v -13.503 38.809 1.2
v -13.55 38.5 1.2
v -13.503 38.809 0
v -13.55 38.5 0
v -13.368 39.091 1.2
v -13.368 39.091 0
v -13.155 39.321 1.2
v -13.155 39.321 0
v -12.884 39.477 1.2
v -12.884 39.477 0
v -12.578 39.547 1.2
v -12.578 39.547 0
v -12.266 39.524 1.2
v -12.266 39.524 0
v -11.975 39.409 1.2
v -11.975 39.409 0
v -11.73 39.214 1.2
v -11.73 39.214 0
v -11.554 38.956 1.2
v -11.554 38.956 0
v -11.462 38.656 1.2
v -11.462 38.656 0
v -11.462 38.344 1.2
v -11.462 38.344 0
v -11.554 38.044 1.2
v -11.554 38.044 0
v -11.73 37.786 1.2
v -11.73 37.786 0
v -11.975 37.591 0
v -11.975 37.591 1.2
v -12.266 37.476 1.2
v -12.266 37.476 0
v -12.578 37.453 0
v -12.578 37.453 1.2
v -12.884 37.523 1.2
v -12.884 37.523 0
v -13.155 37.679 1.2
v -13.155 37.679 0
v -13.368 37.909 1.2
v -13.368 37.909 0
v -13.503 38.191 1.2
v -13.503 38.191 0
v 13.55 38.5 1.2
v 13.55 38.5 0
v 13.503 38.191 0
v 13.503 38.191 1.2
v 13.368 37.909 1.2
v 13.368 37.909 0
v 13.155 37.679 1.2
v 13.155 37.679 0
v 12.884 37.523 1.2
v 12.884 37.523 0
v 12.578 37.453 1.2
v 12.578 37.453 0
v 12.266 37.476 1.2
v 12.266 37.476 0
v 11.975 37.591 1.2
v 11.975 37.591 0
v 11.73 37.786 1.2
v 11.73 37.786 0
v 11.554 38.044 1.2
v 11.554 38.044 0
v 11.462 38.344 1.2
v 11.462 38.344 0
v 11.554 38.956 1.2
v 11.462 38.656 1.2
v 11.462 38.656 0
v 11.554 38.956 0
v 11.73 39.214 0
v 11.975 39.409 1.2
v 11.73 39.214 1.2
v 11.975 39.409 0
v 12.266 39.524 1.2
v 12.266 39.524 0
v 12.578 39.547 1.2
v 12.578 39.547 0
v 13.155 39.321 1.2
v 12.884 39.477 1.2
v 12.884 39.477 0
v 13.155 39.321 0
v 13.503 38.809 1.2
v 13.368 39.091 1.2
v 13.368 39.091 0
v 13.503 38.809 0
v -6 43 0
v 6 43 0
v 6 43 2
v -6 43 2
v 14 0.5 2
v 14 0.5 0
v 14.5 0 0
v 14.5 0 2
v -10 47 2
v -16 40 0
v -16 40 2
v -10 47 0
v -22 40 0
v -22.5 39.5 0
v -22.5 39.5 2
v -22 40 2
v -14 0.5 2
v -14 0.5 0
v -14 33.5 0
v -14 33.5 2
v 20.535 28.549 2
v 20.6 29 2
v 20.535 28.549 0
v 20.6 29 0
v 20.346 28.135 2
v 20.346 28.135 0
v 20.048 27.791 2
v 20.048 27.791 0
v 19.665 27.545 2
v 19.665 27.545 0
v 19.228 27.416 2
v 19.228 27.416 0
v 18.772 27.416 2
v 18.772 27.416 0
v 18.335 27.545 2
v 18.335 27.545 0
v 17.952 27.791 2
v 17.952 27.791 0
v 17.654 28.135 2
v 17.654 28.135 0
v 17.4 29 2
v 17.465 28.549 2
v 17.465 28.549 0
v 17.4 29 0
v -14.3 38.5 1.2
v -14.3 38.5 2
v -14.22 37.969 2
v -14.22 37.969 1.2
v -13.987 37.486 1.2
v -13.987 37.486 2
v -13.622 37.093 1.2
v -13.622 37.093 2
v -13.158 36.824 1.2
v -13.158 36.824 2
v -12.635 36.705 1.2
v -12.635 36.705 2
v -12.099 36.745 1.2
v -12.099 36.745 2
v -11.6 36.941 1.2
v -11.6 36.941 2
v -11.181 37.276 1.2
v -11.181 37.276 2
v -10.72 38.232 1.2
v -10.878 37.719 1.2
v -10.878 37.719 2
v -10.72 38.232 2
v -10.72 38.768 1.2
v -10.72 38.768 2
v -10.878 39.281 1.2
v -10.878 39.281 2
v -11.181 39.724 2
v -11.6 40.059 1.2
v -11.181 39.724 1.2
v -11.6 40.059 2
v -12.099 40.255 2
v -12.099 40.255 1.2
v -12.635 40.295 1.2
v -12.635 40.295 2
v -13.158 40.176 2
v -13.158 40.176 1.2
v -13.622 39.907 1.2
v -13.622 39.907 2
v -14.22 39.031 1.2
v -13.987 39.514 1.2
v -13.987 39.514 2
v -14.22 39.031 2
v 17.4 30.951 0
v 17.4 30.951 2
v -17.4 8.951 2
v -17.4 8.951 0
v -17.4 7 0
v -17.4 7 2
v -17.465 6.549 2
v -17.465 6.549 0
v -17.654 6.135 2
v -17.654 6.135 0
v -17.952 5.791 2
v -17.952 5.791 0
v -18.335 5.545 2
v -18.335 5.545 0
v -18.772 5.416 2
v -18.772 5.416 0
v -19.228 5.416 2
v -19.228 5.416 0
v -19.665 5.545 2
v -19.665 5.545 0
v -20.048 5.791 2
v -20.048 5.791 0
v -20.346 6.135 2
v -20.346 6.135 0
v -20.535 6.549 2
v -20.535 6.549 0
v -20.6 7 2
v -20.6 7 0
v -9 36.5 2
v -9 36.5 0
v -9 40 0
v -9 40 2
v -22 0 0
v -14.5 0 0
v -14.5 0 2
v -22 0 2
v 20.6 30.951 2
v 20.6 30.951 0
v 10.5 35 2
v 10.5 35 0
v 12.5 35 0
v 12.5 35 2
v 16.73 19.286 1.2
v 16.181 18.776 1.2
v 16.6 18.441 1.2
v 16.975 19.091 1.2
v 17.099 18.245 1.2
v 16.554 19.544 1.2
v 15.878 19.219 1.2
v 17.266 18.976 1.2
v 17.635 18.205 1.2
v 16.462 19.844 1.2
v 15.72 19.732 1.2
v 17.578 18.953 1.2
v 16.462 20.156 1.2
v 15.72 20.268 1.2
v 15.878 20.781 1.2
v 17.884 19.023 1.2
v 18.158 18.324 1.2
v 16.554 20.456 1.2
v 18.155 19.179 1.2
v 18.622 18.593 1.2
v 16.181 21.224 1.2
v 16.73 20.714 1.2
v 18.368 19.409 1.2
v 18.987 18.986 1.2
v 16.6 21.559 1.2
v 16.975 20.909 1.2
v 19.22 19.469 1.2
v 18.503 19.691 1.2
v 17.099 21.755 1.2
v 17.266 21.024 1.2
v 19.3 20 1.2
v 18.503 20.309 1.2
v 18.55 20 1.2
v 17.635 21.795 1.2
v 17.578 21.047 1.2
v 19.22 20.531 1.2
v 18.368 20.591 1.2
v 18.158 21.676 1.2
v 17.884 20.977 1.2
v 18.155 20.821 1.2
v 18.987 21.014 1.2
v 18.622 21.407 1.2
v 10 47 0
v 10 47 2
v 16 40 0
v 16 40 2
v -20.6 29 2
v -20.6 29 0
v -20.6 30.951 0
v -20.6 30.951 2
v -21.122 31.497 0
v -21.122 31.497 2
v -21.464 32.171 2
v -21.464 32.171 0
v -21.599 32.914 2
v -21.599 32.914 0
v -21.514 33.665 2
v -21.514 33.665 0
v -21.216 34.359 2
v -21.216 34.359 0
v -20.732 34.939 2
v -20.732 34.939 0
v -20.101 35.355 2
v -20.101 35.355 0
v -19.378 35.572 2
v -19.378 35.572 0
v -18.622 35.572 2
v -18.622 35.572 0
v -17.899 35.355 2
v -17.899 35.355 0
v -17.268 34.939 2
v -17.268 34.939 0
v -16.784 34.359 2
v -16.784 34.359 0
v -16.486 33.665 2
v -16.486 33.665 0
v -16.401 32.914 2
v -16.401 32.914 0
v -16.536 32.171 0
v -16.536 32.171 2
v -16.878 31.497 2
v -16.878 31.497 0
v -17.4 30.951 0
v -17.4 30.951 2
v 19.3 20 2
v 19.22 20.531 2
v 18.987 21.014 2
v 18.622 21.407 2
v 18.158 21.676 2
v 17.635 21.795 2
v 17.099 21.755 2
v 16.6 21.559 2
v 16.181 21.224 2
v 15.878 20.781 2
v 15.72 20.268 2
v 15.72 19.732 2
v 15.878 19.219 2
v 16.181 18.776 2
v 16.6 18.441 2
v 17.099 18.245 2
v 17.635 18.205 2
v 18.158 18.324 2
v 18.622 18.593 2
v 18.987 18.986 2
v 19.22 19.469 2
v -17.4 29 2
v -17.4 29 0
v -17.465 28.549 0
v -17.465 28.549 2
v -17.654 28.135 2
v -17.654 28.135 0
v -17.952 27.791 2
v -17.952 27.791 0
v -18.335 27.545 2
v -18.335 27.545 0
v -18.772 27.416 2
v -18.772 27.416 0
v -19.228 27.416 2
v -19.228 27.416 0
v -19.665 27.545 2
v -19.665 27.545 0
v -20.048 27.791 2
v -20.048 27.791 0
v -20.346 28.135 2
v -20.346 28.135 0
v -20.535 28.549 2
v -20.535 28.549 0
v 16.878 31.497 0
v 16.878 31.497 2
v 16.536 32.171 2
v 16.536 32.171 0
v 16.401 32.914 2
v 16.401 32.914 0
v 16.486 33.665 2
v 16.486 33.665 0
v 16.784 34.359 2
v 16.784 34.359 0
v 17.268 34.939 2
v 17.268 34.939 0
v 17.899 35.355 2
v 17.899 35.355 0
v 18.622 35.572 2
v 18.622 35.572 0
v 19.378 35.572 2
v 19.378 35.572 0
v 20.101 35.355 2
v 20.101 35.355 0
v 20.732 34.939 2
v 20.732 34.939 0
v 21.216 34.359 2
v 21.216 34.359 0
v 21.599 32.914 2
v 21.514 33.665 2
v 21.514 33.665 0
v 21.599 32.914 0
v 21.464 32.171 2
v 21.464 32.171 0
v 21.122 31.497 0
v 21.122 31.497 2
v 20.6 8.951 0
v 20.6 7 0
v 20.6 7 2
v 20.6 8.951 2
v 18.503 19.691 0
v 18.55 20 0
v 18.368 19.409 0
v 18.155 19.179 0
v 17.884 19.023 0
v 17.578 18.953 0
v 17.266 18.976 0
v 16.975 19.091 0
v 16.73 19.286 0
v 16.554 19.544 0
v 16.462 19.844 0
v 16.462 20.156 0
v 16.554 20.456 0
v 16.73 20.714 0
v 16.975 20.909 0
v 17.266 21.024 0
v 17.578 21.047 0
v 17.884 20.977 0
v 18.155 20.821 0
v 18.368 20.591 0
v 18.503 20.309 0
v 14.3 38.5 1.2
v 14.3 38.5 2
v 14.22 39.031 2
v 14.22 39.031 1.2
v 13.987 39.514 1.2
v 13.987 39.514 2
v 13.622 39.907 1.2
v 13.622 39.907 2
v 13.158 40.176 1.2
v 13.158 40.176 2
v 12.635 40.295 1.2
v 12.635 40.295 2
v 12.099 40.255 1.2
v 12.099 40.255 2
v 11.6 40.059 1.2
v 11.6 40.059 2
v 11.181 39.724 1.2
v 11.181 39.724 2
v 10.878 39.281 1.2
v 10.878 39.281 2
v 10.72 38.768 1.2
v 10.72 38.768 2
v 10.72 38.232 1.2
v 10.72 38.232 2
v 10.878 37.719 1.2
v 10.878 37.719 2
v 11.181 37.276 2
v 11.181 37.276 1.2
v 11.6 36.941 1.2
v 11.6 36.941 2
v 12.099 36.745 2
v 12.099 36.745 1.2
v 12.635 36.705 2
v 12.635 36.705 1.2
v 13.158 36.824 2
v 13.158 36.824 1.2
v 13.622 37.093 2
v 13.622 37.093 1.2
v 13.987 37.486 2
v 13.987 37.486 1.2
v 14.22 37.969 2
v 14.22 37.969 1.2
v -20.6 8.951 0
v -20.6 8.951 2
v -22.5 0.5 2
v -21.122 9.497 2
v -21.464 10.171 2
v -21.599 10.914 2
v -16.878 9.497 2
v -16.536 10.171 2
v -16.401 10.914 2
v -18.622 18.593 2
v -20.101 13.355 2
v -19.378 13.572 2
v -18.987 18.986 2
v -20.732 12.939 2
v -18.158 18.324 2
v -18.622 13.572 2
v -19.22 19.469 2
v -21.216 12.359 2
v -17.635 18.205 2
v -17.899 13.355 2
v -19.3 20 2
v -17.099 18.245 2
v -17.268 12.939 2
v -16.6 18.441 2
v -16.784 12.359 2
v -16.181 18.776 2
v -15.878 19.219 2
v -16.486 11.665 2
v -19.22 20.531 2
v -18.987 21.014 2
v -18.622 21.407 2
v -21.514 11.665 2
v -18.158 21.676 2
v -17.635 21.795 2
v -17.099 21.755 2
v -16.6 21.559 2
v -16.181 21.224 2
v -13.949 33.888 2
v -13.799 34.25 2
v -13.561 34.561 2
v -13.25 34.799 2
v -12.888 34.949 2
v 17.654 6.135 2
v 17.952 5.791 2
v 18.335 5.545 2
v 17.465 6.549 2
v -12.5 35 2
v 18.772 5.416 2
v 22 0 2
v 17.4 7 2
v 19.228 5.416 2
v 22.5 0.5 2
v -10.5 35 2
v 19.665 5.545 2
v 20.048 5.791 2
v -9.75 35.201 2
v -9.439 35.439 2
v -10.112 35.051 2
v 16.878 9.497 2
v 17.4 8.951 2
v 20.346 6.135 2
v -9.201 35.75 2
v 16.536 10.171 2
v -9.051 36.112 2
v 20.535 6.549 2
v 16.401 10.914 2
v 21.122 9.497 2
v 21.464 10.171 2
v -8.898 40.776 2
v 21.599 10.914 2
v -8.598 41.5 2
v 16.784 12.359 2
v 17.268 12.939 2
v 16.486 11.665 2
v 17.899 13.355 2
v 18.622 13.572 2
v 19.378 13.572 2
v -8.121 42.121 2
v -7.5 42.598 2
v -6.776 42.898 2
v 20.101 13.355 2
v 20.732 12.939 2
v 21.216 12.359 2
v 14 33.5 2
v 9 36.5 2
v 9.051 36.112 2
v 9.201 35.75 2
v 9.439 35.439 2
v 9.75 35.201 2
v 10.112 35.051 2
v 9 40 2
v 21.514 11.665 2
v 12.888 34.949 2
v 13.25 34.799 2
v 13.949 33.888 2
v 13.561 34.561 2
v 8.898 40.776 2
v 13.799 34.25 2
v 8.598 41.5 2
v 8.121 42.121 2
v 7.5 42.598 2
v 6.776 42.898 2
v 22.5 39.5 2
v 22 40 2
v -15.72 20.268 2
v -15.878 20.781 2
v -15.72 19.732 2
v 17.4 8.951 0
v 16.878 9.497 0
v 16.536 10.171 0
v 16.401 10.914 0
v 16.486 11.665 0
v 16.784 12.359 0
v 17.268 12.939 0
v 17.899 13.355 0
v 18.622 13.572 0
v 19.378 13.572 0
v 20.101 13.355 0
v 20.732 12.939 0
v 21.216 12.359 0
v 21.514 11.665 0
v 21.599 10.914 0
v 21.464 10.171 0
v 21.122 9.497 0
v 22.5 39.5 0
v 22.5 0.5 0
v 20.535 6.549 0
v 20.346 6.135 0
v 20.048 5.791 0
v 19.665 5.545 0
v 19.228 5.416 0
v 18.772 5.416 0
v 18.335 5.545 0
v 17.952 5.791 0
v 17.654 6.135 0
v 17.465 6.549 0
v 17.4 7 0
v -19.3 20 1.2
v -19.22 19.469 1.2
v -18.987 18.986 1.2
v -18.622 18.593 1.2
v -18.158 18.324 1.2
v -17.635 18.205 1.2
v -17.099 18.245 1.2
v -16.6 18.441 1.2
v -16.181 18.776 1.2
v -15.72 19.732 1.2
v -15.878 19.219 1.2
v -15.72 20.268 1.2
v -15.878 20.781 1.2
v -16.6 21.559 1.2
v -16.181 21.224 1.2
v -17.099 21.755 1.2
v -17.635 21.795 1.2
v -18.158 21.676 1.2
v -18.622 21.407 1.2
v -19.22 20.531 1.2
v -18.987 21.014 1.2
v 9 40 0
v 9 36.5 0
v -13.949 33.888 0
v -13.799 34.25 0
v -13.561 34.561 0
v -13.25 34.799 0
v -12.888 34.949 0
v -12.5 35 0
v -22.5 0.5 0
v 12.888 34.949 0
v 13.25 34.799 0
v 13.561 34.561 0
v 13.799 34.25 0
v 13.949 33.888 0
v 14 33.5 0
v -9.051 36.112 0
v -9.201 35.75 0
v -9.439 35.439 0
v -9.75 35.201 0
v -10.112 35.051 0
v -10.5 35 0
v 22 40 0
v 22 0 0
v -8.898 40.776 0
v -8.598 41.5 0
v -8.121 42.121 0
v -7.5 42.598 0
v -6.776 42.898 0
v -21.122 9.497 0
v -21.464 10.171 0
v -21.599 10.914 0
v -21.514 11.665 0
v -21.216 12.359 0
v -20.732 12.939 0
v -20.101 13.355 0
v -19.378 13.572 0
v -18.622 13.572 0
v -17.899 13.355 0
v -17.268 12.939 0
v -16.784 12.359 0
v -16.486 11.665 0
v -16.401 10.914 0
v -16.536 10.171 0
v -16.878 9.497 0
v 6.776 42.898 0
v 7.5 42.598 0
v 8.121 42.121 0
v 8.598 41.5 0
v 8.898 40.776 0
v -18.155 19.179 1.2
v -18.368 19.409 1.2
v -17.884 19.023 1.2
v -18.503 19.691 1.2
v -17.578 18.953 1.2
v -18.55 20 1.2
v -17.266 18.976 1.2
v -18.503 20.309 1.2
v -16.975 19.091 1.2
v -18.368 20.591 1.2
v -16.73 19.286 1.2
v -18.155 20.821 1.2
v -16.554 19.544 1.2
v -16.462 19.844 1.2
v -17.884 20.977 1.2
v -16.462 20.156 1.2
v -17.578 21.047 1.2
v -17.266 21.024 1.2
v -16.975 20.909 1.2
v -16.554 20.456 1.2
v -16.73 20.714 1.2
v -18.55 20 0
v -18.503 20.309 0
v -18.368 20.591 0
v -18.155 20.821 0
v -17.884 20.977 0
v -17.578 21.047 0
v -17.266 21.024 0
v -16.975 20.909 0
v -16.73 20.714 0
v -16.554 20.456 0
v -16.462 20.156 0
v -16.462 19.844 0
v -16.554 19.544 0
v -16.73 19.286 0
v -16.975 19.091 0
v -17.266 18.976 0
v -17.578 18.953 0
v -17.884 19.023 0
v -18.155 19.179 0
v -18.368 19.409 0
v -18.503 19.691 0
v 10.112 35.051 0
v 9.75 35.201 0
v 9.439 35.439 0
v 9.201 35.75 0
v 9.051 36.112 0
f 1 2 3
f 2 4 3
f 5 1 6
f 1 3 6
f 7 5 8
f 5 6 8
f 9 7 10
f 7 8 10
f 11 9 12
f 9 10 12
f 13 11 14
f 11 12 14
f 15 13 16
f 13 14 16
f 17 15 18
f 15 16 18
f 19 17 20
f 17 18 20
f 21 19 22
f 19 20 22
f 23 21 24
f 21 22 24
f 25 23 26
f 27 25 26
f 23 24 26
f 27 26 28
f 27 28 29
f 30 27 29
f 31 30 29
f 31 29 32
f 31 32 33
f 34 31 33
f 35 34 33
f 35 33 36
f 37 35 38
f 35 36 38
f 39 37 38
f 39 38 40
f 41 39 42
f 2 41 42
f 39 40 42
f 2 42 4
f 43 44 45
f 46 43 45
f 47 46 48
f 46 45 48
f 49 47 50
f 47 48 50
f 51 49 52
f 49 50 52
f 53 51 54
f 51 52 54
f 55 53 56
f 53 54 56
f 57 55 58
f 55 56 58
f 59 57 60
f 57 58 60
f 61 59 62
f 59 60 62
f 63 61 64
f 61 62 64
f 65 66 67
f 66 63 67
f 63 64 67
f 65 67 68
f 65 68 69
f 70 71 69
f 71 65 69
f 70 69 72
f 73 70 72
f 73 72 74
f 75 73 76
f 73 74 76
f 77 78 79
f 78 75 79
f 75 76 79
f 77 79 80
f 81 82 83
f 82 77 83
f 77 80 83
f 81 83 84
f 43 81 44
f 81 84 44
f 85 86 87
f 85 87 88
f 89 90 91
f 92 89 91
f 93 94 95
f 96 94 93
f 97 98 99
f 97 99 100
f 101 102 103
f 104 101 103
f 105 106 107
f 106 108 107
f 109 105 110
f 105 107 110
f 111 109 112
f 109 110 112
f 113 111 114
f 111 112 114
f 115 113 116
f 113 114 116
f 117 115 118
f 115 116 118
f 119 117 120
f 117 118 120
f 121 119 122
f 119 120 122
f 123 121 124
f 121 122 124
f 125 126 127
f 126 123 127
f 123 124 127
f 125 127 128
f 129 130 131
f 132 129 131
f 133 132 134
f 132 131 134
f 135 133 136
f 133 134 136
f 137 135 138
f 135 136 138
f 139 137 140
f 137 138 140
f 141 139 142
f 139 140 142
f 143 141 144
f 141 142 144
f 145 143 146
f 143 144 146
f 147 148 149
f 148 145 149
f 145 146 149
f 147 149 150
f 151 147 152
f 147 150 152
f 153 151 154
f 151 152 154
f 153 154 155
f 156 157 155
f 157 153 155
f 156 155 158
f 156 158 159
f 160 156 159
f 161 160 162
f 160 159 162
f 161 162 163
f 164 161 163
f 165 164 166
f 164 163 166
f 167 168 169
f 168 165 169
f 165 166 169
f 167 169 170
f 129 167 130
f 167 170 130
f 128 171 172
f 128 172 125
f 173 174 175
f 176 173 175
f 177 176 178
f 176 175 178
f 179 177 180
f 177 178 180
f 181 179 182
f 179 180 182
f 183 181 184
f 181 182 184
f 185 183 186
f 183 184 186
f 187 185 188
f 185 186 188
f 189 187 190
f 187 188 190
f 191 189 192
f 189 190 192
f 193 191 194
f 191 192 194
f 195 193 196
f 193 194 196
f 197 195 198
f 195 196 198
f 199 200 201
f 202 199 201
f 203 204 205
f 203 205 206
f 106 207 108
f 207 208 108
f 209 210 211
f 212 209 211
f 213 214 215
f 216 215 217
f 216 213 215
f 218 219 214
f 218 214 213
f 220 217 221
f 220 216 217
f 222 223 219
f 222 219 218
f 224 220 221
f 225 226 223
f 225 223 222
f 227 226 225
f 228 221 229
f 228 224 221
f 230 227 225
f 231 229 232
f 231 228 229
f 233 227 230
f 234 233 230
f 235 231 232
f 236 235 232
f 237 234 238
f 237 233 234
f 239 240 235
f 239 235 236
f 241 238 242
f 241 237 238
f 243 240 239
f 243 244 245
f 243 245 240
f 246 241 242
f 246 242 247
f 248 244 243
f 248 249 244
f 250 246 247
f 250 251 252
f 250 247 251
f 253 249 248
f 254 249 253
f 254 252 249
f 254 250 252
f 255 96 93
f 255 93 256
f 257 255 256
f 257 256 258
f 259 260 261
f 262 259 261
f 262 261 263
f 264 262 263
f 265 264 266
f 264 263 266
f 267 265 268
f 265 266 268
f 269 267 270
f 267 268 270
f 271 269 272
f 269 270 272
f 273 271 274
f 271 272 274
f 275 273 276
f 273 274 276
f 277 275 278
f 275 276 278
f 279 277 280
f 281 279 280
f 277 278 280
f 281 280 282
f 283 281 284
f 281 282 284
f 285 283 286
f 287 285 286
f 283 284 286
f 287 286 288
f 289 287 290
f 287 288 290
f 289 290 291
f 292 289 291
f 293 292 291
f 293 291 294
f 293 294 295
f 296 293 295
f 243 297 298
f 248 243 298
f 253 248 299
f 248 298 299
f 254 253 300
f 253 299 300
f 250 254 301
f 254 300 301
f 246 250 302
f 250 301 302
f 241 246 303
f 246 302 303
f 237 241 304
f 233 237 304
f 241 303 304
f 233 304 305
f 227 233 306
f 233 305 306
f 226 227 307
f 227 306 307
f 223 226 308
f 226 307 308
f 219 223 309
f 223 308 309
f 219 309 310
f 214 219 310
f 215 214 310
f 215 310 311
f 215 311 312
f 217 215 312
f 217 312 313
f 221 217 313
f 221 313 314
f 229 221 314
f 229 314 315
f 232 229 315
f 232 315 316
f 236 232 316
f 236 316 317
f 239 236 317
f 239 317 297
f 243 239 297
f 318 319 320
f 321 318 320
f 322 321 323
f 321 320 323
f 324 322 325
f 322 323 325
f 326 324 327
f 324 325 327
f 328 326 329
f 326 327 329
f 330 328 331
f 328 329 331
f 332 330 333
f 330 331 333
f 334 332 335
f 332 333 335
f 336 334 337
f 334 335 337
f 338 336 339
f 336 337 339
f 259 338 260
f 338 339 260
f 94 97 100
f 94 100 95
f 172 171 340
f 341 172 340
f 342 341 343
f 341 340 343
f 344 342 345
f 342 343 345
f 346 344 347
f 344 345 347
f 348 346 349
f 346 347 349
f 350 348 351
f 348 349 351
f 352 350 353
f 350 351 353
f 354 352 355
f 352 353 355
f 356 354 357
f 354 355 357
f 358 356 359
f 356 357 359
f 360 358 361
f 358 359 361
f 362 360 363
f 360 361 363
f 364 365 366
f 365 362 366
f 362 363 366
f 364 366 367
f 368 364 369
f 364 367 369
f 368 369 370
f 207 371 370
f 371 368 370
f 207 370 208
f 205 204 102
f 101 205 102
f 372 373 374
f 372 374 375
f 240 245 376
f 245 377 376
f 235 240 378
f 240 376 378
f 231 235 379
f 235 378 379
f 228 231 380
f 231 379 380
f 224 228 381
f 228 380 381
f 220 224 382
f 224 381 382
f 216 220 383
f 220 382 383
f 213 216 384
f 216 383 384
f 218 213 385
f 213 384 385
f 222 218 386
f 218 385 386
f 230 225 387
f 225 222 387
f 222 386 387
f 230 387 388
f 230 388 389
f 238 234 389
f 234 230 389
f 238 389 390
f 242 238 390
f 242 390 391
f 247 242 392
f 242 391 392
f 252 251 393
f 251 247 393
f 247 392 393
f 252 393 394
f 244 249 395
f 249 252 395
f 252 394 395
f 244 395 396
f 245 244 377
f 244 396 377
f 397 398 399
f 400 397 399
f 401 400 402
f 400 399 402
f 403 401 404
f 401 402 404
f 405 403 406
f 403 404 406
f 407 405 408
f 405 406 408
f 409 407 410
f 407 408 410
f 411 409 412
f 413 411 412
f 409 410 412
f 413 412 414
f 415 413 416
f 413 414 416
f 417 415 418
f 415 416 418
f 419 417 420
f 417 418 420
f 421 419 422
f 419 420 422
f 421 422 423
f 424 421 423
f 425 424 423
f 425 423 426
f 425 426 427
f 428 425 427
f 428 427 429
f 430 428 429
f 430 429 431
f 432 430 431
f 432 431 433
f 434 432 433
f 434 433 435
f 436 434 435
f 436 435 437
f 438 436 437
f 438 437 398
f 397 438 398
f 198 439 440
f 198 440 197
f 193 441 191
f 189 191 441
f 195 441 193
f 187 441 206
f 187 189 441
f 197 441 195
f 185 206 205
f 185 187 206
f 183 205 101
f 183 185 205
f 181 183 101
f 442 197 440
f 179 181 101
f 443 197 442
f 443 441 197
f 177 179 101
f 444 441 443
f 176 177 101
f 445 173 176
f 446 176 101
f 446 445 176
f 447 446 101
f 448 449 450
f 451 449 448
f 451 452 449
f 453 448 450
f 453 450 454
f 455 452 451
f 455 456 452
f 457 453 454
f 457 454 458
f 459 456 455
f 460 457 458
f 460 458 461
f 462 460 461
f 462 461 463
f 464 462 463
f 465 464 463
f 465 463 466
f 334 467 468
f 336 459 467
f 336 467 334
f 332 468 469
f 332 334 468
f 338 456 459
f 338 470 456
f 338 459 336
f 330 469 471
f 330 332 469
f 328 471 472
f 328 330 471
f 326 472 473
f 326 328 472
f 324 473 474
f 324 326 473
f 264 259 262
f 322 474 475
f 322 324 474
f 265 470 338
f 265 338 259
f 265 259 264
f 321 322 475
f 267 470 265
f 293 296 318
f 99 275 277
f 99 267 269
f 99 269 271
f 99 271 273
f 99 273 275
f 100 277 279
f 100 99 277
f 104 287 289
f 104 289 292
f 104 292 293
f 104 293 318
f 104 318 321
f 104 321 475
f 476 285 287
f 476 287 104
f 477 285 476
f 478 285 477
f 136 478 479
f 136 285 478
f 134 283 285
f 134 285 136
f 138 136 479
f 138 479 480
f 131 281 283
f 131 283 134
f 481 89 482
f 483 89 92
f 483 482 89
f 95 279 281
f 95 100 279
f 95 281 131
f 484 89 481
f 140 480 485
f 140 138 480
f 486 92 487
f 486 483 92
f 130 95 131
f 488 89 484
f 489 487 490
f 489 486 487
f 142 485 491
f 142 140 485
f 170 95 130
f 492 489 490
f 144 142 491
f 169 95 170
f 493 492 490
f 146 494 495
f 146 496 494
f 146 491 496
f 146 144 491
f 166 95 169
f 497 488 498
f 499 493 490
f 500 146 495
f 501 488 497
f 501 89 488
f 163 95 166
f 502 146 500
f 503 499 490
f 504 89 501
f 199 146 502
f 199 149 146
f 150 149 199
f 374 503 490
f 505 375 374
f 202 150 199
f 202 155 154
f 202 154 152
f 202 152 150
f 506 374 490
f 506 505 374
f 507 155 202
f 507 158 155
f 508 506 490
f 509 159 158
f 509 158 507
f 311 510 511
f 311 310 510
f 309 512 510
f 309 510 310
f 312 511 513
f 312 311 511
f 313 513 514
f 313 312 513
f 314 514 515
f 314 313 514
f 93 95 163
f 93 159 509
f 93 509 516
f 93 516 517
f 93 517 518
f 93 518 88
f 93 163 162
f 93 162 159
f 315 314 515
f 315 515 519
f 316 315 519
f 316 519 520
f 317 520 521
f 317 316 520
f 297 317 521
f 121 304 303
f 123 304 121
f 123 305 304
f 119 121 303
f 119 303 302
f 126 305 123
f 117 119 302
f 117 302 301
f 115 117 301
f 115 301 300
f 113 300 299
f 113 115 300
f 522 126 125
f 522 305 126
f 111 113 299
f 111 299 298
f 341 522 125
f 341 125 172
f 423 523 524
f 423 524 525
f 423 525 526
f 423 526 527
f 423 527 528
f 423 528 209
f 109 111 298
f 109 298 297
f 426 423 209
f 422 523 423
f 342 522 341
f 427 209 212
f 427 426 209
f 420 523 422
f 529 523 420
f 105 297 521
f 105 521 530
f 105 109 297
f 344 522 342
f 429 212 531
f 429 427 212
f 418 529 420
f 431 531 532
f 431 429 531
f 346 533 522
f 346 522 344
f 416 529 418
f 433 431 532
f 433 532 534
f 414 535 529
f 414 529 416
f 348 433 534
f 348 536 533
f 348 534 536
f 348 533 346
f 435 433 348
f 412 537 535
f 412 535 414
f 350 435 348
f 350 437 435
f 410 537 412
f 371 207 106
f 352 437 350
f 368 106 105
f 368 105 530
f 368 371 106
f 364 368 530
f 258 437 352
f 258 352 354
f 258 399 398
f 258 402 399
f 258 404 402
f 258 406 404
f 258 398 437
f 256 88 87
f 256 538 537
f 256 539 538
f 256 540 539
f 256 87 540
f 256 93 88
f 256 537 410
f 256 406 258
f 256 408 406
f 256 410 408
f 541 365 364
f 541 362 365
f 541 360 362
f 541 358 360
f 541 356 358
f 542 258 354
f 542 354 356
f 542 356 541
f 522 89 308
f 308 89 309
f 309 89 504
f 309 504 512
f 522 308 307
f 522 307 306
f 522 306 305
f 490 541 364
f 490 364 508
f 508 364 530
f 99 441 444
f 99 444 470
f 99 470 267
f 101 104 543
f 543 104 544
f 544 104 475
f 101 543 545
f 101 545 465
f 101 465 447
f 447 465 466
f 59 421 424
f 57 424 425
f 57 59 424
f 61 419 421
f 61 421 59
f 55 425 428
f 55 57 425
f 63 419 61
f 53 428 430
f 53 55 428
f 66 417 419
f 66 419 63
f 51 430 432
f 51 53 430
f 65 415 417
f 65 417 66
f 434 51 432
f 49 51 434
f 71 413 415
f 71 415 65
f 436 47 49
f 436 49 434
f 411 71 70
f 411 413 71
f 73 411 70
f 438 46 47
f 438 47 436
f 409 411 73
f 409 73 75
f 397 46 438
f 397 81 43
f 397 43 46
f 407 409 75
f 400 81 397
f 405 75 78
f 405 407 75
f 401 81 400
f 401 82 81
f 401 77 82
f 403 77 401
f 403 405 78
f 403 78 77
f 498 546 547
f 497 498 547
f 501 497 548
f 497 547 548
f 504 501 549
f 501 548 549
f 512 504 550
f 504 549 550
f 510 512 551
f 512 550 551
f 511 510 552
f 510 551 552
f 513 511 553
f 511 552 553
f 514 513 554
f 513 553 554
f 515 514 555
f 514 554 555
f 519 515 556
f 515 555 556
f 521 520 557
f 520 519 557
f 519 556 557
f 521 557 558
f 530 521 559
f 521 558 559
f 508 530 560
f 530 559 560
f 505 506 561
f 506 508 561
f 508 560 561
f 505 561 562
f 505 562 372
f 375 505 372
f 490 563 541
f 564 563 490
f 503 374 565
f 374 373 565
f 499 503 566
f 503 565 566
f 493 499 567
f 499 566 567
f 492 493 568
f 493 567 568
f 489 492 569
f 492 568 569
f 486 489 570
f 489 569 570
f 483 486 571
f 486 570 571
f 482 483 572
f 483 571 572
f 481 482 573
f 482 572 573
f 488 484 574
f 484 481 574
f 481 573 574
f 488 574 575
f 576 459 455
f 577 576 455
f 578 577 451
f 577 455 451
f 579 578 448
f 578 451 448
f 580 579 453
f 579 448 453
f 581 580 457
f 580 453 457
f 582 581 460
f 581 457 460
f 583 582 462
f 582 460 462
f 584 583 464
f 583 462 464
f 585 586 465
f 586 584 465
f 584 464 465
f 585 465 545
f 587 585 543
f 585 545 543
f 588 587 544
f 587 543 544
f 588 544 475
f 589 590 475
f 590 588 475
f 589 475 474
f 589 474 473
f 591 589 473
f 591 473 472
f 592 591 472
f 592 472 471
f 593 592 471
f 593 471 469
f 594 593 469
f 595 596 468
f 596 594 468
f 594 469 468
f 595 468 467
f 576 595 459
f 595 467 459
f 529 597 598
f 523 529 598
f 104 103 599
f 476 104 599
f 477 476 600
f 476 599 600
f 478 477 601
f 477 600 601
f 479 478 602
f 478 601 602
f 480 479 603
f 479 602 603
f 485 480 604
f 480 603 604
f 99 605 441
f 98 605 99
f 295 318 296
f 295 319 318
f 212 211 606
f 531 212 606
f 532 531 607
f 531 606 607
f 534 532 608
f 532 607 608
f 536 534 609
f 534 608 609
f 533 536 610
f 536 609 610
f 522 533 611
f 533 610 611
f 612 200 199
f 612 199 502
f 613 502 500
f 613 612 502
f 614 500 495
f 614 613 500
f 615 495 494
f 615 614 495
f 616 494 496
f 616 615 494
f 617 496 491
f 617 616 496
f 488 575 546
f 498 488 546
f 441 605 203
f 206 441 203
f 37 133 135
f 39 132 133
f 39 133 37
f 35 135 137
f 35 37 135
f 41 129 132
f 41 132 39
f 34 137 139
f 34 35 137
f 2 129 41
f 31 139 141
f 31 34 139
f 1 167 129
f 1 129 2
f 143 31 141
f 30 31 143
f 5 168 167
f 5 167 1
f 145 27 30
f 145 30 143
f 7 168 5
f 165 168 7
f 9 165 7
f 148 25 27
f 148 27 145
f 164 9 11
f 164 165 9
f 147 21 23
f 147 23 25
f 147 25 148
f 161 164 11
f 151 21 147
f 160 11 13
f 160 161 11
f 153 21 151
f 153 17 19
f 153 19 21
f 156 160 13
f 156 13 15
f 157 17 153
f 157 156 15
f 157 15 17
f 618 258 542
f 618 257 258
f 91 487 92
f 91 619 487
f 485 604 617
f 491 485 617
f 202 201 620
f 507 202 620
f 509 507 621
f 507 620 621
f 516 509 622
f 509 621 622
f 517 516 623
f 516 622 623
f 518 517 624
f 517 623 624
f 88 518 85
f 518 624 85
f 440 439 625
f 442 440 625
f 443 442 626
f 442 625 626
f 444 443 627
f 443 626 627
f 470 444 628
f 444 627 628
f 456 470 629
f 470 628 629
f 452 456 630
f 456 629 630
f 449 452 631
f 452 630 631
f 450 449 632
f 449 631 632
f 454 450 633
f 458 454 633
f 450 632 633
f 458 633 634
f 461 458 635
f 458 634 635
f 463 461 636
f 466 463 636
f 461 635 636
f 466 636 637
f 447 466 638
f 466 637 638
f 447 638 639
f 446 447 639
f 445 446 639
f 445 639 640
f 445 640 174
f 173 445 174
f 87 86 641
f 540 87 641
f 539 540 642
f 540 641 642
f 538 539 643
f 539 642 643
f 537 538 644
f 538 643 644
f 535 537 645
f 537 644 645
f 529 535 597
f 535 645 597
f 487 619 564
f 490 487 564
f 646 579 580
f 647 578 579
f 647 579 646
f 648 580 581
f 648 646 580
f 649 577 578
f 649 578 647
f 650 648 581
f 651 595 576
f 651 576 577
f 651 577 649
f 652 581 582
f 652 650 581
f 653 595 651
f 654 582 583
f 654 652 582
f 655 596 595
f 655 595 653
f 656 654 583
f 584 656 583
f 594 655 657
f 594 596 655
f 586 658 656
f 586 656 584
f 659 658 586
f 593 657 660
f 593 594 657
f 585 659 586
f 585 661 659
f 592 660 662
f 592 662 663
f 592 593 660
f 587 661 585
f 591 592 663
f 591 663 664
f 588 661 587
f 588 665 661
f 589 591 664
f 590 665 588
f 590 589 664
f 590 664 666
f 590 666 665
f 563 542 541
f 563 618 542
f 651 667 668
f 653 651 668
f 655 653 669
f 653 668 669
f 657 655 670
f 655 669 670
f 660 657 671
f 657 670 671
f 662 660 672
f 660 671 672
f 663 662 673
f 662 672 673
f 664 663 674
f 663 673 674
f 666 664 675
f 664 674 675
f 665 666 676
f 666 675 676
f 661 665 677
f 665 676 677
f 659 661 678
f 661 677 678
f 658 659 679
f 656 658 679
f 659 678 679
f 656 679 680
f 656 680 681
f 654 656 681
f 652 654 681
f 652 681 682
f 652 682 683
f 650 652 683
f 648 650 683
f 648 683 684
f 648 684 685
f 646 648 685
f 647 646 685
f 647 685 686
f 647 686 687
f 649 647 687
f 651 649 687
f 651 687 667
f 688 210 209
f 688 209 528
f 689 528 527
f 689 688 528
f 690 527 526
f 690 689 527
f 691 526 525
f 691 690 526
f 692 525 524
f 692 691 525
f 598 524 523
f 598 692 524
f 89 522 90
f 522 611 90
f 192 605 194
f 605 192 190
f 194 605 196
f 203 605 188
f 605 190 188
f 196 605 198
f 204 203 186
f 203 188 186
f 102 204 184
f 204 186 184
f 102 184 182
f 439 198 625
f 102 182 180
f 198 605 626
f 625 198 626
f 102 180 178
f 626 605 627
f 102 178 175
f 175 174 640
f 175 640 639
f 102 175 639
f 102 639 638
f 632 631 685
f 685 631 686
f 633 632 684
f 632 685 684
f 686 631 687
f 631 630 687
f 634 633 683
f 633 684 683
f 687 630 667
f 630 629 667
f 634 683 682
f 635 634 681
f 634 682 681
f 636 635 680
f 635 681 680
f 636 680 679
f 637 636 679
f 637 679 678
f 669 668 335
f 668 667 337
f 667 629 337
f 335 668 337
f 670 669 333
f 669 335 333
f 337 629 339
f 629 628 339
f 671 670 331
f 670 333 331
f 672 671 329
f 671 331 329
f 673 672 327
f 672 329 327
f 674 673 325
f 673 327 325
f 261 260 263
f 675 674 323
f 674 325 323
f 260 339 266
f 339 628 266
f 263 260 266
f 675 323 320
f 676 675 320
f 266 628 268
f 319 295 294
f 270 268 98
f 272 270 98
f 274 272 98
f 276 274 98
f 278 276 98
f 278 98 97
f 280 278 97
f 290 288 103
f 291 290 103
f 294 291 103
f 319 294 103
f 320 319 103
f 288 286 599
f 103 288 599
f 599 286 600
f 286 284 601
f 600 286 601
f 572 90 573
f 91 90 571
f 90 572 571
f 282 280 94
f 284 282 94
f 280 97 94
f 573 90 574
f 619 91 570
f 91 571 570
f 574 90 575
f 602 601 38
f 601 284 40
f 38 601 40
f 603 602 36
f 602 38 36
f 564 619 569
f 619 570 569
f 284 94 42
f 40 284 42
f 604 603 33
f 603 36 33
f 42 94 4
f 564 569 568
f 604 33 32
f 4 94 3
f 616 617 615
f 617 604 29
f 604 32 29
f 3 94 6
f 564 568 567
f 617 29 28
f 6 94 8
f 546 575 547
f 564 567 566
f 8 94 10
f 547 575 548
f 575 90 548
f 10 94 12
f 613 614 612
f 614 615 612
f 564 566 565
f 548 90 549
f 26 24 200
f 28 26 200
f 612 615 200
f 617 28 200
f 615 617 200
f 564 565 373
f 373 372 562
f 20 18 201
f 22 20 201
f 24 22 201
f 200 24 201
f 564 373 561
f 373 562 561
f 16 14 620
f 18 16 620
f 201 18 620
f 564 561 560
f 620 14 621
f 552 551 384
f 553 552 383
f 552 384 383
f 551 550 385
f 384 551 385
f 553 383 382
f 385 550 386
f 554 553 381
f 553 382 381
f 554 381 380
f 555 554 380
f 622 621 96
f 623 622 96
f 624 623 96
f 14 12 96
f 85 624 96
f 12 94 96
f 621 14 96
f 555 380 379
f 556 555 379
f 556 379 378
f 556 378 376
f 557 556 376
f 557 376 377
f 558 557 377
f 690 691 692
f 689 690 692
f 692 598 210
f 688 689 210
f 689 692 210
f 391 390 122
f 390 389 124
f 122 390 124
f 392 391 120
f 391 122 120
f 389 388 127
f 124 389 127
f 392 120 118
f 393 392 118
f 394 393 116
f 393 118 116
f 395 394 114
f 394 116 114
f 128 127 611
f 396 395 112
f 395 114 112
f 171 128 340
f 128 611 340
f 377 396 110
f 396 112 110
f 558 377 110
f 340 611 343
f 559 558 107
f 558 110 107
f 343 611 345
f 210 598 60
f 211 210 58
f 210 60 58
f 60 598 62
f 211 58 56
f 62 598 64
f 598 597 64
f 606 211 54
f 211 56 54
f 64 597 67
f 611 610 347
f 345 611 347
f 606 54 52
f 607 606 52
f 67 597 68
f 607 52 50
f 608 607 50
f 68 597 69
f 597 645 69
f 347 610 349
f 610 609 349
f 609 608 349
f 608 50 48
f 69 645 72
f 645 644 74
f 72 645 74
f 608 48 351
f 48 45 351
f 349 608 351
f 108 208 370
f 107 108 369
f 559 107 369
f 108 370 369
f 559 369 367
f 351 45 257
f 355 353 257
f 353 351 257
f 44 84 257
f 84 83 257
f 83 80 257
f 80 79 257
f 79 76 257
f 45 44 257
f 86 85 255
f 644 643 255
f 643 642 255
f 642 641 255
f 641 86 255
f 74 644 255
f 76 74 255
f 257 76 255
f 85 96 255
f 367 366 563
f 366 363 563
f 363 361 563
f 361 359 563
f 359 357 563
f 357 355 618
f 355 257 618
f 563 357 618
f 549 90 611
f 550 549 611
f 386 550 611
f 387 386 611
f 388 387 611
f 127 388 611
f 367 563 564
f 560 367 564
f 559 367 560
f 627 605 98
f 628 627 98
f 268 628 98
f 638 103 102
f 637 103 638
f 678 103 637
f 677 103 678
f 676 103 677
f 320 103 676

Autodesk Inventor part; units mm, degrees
ref_plane "YZ Plane" through (0, 0, 0) normal (1, 0, 0) x (0, 1, 0)
ref_plane "XZ Plane" through (0, 0, 0) normal (0, 1, 0) x (-1, 0, 0)
ref_plane "XY Plane" through (0, 0, 0) normal (0, 0, 1) x (1, 0, 0)
sketch "スケッチ1" plane through (0, 0, 0) normal (0, 0, 1) x (1, 0, 0)
  line L0 (0, 0) -> (0, 51.1276) construction
  line L1 (-6, 43) -> (6, 43) construction
  arc A0 (9, 40) -> (6, 43) centre (6, 40) ccw projected
  line L2 (9, 40) -> (9, 36.5) projected
  line L3 (10.5, 35) -> (12.5, 35)
  arc A1 (14, 33.5) -> (12.5, 35) centre (12.5, 33.5) ccw
  line L4 (14, 0) -> (14, 33.5) construction
  line L5 (10, 47) -> (-10, 47) construction
  line L6 (16, 40) -> (10, 47) construction
  line L7 (16, 26.6395) -> (16, 40) construction
  circle A2 centre (12.5, 38.5) radius 1.5 construction
  circle A3 centre (17.5, 20) radius 1.5 construction
  line L8 (22.5, 39.5) -> (22.5, 0.5)
  line L9 (22, 0) -> (14.5, 0)
  arc A4 (20.6, 30.9506) -> (17.4, 30.9506) centre (19, 33) ccw
  arc A5 (17.4, 29) -> (20.6, 29) centre (19, 29) ccw
  line L10 (17.4, 30.9506) -> (17.4, 29)
  line L11 (20.6, 30.9506) -> (20.6, 29)
  line L12 (19, 29) -> (19, 33) construction
  line L13 (10, 47) -> (16, 40)
  arc A6 (17.4, 7) -> (20.6, 7) centre (19, 7) ccw
  line L14 (17.4, 7) -> (17.4, 8.9506)
  line L15 (20.6, 7) -> (20.6, 8.9506)
  arc A7 (20.6, 8.9506) -> (17.4, 8.9506) centre (19, 11) ccw
  line L16 (19, 11) -> (19, 7) construction
  line L17 (14, 33.5) -> (14, 0.5)
  line L18 (0, 43) -> (0, 47)
  line L19 (0, 47) -> (10, 47)
  line L20 (6, 43) -> (0, 43)
  line L21 (16, 40) -> (22, 40)
  line L22 (22, 40) -> (22.5, 39.5)
  line L23 (22, 0) -> (22.5, 0.5)
  circle A8 centre (17.5, 20) radius 1.05
  circle A9 centre (12.5, 38.5) radius 1.05
  arc A10 (9, 36.5) -> (10.5, 35) centre (10.5, 36.5) ccw
  line L24 (14, 0.5) -> (14.5, 0)
  point P0 (22.5, 40)
  point P1 (22.5, 0)
  dimension "d5" = 2.6
  dimension "d6" = 4
  dimension "d10" = 4
  dimension "d14" = 0.5
  dimension "d15" = 0.5
  dimension "d17" = 0.5
  dimension "d18" = 0.5
  dimension "d19" = 2.1
  dimension "d20" = 9
  dimension "d21" = 9
  dimension "d22" = 2.1
  dimension "d23" = 1.5
  dimension "d24" = 1.6
  dimension "d25" = 2.6
  dimension "d26" = 1.6
  dimension "d28" = 38
  dimension "d29" = 45
  dimension "d30" = 40
  dimension "d31" = 0.5
  dimension "d32" = 0.5
  dimension "d36" = 28
  dimension "d37" = 10
  dimension "d38" = 6
  dimension "d39" = 7
extrude "押し出し1" add sketch "スケッチ1" along normal blind 2
sketch "スケッチ3" plane through (0, 0, 2) normal (0, 0, 1) x (1, 0, 0)
  circle A0 centre (17.5, 20) radius 1.05 projected
  circle A1 centre (17.5, 20) radius 1.8
  circle A2 centre (12.5, 38.5) radius 1.05 projected
  circle A3 centre (12.5, 38.5) radius 1.8
  point P0 (0, 0)
  dimension "d33" = 3.6
extrude "押し出し2" cut sketch "スケッチ3" against normal blind 0.8
mirror "ミラー1" about plane through (0, 0, 0) normal (1, 0, 0) of "押し出し1", "押し出し2"
equation "\"d15\" = d14"
equation "\"d18\" = d17"
properties part number "16_035_BATTERY_HOLDER_BACK_R1"
